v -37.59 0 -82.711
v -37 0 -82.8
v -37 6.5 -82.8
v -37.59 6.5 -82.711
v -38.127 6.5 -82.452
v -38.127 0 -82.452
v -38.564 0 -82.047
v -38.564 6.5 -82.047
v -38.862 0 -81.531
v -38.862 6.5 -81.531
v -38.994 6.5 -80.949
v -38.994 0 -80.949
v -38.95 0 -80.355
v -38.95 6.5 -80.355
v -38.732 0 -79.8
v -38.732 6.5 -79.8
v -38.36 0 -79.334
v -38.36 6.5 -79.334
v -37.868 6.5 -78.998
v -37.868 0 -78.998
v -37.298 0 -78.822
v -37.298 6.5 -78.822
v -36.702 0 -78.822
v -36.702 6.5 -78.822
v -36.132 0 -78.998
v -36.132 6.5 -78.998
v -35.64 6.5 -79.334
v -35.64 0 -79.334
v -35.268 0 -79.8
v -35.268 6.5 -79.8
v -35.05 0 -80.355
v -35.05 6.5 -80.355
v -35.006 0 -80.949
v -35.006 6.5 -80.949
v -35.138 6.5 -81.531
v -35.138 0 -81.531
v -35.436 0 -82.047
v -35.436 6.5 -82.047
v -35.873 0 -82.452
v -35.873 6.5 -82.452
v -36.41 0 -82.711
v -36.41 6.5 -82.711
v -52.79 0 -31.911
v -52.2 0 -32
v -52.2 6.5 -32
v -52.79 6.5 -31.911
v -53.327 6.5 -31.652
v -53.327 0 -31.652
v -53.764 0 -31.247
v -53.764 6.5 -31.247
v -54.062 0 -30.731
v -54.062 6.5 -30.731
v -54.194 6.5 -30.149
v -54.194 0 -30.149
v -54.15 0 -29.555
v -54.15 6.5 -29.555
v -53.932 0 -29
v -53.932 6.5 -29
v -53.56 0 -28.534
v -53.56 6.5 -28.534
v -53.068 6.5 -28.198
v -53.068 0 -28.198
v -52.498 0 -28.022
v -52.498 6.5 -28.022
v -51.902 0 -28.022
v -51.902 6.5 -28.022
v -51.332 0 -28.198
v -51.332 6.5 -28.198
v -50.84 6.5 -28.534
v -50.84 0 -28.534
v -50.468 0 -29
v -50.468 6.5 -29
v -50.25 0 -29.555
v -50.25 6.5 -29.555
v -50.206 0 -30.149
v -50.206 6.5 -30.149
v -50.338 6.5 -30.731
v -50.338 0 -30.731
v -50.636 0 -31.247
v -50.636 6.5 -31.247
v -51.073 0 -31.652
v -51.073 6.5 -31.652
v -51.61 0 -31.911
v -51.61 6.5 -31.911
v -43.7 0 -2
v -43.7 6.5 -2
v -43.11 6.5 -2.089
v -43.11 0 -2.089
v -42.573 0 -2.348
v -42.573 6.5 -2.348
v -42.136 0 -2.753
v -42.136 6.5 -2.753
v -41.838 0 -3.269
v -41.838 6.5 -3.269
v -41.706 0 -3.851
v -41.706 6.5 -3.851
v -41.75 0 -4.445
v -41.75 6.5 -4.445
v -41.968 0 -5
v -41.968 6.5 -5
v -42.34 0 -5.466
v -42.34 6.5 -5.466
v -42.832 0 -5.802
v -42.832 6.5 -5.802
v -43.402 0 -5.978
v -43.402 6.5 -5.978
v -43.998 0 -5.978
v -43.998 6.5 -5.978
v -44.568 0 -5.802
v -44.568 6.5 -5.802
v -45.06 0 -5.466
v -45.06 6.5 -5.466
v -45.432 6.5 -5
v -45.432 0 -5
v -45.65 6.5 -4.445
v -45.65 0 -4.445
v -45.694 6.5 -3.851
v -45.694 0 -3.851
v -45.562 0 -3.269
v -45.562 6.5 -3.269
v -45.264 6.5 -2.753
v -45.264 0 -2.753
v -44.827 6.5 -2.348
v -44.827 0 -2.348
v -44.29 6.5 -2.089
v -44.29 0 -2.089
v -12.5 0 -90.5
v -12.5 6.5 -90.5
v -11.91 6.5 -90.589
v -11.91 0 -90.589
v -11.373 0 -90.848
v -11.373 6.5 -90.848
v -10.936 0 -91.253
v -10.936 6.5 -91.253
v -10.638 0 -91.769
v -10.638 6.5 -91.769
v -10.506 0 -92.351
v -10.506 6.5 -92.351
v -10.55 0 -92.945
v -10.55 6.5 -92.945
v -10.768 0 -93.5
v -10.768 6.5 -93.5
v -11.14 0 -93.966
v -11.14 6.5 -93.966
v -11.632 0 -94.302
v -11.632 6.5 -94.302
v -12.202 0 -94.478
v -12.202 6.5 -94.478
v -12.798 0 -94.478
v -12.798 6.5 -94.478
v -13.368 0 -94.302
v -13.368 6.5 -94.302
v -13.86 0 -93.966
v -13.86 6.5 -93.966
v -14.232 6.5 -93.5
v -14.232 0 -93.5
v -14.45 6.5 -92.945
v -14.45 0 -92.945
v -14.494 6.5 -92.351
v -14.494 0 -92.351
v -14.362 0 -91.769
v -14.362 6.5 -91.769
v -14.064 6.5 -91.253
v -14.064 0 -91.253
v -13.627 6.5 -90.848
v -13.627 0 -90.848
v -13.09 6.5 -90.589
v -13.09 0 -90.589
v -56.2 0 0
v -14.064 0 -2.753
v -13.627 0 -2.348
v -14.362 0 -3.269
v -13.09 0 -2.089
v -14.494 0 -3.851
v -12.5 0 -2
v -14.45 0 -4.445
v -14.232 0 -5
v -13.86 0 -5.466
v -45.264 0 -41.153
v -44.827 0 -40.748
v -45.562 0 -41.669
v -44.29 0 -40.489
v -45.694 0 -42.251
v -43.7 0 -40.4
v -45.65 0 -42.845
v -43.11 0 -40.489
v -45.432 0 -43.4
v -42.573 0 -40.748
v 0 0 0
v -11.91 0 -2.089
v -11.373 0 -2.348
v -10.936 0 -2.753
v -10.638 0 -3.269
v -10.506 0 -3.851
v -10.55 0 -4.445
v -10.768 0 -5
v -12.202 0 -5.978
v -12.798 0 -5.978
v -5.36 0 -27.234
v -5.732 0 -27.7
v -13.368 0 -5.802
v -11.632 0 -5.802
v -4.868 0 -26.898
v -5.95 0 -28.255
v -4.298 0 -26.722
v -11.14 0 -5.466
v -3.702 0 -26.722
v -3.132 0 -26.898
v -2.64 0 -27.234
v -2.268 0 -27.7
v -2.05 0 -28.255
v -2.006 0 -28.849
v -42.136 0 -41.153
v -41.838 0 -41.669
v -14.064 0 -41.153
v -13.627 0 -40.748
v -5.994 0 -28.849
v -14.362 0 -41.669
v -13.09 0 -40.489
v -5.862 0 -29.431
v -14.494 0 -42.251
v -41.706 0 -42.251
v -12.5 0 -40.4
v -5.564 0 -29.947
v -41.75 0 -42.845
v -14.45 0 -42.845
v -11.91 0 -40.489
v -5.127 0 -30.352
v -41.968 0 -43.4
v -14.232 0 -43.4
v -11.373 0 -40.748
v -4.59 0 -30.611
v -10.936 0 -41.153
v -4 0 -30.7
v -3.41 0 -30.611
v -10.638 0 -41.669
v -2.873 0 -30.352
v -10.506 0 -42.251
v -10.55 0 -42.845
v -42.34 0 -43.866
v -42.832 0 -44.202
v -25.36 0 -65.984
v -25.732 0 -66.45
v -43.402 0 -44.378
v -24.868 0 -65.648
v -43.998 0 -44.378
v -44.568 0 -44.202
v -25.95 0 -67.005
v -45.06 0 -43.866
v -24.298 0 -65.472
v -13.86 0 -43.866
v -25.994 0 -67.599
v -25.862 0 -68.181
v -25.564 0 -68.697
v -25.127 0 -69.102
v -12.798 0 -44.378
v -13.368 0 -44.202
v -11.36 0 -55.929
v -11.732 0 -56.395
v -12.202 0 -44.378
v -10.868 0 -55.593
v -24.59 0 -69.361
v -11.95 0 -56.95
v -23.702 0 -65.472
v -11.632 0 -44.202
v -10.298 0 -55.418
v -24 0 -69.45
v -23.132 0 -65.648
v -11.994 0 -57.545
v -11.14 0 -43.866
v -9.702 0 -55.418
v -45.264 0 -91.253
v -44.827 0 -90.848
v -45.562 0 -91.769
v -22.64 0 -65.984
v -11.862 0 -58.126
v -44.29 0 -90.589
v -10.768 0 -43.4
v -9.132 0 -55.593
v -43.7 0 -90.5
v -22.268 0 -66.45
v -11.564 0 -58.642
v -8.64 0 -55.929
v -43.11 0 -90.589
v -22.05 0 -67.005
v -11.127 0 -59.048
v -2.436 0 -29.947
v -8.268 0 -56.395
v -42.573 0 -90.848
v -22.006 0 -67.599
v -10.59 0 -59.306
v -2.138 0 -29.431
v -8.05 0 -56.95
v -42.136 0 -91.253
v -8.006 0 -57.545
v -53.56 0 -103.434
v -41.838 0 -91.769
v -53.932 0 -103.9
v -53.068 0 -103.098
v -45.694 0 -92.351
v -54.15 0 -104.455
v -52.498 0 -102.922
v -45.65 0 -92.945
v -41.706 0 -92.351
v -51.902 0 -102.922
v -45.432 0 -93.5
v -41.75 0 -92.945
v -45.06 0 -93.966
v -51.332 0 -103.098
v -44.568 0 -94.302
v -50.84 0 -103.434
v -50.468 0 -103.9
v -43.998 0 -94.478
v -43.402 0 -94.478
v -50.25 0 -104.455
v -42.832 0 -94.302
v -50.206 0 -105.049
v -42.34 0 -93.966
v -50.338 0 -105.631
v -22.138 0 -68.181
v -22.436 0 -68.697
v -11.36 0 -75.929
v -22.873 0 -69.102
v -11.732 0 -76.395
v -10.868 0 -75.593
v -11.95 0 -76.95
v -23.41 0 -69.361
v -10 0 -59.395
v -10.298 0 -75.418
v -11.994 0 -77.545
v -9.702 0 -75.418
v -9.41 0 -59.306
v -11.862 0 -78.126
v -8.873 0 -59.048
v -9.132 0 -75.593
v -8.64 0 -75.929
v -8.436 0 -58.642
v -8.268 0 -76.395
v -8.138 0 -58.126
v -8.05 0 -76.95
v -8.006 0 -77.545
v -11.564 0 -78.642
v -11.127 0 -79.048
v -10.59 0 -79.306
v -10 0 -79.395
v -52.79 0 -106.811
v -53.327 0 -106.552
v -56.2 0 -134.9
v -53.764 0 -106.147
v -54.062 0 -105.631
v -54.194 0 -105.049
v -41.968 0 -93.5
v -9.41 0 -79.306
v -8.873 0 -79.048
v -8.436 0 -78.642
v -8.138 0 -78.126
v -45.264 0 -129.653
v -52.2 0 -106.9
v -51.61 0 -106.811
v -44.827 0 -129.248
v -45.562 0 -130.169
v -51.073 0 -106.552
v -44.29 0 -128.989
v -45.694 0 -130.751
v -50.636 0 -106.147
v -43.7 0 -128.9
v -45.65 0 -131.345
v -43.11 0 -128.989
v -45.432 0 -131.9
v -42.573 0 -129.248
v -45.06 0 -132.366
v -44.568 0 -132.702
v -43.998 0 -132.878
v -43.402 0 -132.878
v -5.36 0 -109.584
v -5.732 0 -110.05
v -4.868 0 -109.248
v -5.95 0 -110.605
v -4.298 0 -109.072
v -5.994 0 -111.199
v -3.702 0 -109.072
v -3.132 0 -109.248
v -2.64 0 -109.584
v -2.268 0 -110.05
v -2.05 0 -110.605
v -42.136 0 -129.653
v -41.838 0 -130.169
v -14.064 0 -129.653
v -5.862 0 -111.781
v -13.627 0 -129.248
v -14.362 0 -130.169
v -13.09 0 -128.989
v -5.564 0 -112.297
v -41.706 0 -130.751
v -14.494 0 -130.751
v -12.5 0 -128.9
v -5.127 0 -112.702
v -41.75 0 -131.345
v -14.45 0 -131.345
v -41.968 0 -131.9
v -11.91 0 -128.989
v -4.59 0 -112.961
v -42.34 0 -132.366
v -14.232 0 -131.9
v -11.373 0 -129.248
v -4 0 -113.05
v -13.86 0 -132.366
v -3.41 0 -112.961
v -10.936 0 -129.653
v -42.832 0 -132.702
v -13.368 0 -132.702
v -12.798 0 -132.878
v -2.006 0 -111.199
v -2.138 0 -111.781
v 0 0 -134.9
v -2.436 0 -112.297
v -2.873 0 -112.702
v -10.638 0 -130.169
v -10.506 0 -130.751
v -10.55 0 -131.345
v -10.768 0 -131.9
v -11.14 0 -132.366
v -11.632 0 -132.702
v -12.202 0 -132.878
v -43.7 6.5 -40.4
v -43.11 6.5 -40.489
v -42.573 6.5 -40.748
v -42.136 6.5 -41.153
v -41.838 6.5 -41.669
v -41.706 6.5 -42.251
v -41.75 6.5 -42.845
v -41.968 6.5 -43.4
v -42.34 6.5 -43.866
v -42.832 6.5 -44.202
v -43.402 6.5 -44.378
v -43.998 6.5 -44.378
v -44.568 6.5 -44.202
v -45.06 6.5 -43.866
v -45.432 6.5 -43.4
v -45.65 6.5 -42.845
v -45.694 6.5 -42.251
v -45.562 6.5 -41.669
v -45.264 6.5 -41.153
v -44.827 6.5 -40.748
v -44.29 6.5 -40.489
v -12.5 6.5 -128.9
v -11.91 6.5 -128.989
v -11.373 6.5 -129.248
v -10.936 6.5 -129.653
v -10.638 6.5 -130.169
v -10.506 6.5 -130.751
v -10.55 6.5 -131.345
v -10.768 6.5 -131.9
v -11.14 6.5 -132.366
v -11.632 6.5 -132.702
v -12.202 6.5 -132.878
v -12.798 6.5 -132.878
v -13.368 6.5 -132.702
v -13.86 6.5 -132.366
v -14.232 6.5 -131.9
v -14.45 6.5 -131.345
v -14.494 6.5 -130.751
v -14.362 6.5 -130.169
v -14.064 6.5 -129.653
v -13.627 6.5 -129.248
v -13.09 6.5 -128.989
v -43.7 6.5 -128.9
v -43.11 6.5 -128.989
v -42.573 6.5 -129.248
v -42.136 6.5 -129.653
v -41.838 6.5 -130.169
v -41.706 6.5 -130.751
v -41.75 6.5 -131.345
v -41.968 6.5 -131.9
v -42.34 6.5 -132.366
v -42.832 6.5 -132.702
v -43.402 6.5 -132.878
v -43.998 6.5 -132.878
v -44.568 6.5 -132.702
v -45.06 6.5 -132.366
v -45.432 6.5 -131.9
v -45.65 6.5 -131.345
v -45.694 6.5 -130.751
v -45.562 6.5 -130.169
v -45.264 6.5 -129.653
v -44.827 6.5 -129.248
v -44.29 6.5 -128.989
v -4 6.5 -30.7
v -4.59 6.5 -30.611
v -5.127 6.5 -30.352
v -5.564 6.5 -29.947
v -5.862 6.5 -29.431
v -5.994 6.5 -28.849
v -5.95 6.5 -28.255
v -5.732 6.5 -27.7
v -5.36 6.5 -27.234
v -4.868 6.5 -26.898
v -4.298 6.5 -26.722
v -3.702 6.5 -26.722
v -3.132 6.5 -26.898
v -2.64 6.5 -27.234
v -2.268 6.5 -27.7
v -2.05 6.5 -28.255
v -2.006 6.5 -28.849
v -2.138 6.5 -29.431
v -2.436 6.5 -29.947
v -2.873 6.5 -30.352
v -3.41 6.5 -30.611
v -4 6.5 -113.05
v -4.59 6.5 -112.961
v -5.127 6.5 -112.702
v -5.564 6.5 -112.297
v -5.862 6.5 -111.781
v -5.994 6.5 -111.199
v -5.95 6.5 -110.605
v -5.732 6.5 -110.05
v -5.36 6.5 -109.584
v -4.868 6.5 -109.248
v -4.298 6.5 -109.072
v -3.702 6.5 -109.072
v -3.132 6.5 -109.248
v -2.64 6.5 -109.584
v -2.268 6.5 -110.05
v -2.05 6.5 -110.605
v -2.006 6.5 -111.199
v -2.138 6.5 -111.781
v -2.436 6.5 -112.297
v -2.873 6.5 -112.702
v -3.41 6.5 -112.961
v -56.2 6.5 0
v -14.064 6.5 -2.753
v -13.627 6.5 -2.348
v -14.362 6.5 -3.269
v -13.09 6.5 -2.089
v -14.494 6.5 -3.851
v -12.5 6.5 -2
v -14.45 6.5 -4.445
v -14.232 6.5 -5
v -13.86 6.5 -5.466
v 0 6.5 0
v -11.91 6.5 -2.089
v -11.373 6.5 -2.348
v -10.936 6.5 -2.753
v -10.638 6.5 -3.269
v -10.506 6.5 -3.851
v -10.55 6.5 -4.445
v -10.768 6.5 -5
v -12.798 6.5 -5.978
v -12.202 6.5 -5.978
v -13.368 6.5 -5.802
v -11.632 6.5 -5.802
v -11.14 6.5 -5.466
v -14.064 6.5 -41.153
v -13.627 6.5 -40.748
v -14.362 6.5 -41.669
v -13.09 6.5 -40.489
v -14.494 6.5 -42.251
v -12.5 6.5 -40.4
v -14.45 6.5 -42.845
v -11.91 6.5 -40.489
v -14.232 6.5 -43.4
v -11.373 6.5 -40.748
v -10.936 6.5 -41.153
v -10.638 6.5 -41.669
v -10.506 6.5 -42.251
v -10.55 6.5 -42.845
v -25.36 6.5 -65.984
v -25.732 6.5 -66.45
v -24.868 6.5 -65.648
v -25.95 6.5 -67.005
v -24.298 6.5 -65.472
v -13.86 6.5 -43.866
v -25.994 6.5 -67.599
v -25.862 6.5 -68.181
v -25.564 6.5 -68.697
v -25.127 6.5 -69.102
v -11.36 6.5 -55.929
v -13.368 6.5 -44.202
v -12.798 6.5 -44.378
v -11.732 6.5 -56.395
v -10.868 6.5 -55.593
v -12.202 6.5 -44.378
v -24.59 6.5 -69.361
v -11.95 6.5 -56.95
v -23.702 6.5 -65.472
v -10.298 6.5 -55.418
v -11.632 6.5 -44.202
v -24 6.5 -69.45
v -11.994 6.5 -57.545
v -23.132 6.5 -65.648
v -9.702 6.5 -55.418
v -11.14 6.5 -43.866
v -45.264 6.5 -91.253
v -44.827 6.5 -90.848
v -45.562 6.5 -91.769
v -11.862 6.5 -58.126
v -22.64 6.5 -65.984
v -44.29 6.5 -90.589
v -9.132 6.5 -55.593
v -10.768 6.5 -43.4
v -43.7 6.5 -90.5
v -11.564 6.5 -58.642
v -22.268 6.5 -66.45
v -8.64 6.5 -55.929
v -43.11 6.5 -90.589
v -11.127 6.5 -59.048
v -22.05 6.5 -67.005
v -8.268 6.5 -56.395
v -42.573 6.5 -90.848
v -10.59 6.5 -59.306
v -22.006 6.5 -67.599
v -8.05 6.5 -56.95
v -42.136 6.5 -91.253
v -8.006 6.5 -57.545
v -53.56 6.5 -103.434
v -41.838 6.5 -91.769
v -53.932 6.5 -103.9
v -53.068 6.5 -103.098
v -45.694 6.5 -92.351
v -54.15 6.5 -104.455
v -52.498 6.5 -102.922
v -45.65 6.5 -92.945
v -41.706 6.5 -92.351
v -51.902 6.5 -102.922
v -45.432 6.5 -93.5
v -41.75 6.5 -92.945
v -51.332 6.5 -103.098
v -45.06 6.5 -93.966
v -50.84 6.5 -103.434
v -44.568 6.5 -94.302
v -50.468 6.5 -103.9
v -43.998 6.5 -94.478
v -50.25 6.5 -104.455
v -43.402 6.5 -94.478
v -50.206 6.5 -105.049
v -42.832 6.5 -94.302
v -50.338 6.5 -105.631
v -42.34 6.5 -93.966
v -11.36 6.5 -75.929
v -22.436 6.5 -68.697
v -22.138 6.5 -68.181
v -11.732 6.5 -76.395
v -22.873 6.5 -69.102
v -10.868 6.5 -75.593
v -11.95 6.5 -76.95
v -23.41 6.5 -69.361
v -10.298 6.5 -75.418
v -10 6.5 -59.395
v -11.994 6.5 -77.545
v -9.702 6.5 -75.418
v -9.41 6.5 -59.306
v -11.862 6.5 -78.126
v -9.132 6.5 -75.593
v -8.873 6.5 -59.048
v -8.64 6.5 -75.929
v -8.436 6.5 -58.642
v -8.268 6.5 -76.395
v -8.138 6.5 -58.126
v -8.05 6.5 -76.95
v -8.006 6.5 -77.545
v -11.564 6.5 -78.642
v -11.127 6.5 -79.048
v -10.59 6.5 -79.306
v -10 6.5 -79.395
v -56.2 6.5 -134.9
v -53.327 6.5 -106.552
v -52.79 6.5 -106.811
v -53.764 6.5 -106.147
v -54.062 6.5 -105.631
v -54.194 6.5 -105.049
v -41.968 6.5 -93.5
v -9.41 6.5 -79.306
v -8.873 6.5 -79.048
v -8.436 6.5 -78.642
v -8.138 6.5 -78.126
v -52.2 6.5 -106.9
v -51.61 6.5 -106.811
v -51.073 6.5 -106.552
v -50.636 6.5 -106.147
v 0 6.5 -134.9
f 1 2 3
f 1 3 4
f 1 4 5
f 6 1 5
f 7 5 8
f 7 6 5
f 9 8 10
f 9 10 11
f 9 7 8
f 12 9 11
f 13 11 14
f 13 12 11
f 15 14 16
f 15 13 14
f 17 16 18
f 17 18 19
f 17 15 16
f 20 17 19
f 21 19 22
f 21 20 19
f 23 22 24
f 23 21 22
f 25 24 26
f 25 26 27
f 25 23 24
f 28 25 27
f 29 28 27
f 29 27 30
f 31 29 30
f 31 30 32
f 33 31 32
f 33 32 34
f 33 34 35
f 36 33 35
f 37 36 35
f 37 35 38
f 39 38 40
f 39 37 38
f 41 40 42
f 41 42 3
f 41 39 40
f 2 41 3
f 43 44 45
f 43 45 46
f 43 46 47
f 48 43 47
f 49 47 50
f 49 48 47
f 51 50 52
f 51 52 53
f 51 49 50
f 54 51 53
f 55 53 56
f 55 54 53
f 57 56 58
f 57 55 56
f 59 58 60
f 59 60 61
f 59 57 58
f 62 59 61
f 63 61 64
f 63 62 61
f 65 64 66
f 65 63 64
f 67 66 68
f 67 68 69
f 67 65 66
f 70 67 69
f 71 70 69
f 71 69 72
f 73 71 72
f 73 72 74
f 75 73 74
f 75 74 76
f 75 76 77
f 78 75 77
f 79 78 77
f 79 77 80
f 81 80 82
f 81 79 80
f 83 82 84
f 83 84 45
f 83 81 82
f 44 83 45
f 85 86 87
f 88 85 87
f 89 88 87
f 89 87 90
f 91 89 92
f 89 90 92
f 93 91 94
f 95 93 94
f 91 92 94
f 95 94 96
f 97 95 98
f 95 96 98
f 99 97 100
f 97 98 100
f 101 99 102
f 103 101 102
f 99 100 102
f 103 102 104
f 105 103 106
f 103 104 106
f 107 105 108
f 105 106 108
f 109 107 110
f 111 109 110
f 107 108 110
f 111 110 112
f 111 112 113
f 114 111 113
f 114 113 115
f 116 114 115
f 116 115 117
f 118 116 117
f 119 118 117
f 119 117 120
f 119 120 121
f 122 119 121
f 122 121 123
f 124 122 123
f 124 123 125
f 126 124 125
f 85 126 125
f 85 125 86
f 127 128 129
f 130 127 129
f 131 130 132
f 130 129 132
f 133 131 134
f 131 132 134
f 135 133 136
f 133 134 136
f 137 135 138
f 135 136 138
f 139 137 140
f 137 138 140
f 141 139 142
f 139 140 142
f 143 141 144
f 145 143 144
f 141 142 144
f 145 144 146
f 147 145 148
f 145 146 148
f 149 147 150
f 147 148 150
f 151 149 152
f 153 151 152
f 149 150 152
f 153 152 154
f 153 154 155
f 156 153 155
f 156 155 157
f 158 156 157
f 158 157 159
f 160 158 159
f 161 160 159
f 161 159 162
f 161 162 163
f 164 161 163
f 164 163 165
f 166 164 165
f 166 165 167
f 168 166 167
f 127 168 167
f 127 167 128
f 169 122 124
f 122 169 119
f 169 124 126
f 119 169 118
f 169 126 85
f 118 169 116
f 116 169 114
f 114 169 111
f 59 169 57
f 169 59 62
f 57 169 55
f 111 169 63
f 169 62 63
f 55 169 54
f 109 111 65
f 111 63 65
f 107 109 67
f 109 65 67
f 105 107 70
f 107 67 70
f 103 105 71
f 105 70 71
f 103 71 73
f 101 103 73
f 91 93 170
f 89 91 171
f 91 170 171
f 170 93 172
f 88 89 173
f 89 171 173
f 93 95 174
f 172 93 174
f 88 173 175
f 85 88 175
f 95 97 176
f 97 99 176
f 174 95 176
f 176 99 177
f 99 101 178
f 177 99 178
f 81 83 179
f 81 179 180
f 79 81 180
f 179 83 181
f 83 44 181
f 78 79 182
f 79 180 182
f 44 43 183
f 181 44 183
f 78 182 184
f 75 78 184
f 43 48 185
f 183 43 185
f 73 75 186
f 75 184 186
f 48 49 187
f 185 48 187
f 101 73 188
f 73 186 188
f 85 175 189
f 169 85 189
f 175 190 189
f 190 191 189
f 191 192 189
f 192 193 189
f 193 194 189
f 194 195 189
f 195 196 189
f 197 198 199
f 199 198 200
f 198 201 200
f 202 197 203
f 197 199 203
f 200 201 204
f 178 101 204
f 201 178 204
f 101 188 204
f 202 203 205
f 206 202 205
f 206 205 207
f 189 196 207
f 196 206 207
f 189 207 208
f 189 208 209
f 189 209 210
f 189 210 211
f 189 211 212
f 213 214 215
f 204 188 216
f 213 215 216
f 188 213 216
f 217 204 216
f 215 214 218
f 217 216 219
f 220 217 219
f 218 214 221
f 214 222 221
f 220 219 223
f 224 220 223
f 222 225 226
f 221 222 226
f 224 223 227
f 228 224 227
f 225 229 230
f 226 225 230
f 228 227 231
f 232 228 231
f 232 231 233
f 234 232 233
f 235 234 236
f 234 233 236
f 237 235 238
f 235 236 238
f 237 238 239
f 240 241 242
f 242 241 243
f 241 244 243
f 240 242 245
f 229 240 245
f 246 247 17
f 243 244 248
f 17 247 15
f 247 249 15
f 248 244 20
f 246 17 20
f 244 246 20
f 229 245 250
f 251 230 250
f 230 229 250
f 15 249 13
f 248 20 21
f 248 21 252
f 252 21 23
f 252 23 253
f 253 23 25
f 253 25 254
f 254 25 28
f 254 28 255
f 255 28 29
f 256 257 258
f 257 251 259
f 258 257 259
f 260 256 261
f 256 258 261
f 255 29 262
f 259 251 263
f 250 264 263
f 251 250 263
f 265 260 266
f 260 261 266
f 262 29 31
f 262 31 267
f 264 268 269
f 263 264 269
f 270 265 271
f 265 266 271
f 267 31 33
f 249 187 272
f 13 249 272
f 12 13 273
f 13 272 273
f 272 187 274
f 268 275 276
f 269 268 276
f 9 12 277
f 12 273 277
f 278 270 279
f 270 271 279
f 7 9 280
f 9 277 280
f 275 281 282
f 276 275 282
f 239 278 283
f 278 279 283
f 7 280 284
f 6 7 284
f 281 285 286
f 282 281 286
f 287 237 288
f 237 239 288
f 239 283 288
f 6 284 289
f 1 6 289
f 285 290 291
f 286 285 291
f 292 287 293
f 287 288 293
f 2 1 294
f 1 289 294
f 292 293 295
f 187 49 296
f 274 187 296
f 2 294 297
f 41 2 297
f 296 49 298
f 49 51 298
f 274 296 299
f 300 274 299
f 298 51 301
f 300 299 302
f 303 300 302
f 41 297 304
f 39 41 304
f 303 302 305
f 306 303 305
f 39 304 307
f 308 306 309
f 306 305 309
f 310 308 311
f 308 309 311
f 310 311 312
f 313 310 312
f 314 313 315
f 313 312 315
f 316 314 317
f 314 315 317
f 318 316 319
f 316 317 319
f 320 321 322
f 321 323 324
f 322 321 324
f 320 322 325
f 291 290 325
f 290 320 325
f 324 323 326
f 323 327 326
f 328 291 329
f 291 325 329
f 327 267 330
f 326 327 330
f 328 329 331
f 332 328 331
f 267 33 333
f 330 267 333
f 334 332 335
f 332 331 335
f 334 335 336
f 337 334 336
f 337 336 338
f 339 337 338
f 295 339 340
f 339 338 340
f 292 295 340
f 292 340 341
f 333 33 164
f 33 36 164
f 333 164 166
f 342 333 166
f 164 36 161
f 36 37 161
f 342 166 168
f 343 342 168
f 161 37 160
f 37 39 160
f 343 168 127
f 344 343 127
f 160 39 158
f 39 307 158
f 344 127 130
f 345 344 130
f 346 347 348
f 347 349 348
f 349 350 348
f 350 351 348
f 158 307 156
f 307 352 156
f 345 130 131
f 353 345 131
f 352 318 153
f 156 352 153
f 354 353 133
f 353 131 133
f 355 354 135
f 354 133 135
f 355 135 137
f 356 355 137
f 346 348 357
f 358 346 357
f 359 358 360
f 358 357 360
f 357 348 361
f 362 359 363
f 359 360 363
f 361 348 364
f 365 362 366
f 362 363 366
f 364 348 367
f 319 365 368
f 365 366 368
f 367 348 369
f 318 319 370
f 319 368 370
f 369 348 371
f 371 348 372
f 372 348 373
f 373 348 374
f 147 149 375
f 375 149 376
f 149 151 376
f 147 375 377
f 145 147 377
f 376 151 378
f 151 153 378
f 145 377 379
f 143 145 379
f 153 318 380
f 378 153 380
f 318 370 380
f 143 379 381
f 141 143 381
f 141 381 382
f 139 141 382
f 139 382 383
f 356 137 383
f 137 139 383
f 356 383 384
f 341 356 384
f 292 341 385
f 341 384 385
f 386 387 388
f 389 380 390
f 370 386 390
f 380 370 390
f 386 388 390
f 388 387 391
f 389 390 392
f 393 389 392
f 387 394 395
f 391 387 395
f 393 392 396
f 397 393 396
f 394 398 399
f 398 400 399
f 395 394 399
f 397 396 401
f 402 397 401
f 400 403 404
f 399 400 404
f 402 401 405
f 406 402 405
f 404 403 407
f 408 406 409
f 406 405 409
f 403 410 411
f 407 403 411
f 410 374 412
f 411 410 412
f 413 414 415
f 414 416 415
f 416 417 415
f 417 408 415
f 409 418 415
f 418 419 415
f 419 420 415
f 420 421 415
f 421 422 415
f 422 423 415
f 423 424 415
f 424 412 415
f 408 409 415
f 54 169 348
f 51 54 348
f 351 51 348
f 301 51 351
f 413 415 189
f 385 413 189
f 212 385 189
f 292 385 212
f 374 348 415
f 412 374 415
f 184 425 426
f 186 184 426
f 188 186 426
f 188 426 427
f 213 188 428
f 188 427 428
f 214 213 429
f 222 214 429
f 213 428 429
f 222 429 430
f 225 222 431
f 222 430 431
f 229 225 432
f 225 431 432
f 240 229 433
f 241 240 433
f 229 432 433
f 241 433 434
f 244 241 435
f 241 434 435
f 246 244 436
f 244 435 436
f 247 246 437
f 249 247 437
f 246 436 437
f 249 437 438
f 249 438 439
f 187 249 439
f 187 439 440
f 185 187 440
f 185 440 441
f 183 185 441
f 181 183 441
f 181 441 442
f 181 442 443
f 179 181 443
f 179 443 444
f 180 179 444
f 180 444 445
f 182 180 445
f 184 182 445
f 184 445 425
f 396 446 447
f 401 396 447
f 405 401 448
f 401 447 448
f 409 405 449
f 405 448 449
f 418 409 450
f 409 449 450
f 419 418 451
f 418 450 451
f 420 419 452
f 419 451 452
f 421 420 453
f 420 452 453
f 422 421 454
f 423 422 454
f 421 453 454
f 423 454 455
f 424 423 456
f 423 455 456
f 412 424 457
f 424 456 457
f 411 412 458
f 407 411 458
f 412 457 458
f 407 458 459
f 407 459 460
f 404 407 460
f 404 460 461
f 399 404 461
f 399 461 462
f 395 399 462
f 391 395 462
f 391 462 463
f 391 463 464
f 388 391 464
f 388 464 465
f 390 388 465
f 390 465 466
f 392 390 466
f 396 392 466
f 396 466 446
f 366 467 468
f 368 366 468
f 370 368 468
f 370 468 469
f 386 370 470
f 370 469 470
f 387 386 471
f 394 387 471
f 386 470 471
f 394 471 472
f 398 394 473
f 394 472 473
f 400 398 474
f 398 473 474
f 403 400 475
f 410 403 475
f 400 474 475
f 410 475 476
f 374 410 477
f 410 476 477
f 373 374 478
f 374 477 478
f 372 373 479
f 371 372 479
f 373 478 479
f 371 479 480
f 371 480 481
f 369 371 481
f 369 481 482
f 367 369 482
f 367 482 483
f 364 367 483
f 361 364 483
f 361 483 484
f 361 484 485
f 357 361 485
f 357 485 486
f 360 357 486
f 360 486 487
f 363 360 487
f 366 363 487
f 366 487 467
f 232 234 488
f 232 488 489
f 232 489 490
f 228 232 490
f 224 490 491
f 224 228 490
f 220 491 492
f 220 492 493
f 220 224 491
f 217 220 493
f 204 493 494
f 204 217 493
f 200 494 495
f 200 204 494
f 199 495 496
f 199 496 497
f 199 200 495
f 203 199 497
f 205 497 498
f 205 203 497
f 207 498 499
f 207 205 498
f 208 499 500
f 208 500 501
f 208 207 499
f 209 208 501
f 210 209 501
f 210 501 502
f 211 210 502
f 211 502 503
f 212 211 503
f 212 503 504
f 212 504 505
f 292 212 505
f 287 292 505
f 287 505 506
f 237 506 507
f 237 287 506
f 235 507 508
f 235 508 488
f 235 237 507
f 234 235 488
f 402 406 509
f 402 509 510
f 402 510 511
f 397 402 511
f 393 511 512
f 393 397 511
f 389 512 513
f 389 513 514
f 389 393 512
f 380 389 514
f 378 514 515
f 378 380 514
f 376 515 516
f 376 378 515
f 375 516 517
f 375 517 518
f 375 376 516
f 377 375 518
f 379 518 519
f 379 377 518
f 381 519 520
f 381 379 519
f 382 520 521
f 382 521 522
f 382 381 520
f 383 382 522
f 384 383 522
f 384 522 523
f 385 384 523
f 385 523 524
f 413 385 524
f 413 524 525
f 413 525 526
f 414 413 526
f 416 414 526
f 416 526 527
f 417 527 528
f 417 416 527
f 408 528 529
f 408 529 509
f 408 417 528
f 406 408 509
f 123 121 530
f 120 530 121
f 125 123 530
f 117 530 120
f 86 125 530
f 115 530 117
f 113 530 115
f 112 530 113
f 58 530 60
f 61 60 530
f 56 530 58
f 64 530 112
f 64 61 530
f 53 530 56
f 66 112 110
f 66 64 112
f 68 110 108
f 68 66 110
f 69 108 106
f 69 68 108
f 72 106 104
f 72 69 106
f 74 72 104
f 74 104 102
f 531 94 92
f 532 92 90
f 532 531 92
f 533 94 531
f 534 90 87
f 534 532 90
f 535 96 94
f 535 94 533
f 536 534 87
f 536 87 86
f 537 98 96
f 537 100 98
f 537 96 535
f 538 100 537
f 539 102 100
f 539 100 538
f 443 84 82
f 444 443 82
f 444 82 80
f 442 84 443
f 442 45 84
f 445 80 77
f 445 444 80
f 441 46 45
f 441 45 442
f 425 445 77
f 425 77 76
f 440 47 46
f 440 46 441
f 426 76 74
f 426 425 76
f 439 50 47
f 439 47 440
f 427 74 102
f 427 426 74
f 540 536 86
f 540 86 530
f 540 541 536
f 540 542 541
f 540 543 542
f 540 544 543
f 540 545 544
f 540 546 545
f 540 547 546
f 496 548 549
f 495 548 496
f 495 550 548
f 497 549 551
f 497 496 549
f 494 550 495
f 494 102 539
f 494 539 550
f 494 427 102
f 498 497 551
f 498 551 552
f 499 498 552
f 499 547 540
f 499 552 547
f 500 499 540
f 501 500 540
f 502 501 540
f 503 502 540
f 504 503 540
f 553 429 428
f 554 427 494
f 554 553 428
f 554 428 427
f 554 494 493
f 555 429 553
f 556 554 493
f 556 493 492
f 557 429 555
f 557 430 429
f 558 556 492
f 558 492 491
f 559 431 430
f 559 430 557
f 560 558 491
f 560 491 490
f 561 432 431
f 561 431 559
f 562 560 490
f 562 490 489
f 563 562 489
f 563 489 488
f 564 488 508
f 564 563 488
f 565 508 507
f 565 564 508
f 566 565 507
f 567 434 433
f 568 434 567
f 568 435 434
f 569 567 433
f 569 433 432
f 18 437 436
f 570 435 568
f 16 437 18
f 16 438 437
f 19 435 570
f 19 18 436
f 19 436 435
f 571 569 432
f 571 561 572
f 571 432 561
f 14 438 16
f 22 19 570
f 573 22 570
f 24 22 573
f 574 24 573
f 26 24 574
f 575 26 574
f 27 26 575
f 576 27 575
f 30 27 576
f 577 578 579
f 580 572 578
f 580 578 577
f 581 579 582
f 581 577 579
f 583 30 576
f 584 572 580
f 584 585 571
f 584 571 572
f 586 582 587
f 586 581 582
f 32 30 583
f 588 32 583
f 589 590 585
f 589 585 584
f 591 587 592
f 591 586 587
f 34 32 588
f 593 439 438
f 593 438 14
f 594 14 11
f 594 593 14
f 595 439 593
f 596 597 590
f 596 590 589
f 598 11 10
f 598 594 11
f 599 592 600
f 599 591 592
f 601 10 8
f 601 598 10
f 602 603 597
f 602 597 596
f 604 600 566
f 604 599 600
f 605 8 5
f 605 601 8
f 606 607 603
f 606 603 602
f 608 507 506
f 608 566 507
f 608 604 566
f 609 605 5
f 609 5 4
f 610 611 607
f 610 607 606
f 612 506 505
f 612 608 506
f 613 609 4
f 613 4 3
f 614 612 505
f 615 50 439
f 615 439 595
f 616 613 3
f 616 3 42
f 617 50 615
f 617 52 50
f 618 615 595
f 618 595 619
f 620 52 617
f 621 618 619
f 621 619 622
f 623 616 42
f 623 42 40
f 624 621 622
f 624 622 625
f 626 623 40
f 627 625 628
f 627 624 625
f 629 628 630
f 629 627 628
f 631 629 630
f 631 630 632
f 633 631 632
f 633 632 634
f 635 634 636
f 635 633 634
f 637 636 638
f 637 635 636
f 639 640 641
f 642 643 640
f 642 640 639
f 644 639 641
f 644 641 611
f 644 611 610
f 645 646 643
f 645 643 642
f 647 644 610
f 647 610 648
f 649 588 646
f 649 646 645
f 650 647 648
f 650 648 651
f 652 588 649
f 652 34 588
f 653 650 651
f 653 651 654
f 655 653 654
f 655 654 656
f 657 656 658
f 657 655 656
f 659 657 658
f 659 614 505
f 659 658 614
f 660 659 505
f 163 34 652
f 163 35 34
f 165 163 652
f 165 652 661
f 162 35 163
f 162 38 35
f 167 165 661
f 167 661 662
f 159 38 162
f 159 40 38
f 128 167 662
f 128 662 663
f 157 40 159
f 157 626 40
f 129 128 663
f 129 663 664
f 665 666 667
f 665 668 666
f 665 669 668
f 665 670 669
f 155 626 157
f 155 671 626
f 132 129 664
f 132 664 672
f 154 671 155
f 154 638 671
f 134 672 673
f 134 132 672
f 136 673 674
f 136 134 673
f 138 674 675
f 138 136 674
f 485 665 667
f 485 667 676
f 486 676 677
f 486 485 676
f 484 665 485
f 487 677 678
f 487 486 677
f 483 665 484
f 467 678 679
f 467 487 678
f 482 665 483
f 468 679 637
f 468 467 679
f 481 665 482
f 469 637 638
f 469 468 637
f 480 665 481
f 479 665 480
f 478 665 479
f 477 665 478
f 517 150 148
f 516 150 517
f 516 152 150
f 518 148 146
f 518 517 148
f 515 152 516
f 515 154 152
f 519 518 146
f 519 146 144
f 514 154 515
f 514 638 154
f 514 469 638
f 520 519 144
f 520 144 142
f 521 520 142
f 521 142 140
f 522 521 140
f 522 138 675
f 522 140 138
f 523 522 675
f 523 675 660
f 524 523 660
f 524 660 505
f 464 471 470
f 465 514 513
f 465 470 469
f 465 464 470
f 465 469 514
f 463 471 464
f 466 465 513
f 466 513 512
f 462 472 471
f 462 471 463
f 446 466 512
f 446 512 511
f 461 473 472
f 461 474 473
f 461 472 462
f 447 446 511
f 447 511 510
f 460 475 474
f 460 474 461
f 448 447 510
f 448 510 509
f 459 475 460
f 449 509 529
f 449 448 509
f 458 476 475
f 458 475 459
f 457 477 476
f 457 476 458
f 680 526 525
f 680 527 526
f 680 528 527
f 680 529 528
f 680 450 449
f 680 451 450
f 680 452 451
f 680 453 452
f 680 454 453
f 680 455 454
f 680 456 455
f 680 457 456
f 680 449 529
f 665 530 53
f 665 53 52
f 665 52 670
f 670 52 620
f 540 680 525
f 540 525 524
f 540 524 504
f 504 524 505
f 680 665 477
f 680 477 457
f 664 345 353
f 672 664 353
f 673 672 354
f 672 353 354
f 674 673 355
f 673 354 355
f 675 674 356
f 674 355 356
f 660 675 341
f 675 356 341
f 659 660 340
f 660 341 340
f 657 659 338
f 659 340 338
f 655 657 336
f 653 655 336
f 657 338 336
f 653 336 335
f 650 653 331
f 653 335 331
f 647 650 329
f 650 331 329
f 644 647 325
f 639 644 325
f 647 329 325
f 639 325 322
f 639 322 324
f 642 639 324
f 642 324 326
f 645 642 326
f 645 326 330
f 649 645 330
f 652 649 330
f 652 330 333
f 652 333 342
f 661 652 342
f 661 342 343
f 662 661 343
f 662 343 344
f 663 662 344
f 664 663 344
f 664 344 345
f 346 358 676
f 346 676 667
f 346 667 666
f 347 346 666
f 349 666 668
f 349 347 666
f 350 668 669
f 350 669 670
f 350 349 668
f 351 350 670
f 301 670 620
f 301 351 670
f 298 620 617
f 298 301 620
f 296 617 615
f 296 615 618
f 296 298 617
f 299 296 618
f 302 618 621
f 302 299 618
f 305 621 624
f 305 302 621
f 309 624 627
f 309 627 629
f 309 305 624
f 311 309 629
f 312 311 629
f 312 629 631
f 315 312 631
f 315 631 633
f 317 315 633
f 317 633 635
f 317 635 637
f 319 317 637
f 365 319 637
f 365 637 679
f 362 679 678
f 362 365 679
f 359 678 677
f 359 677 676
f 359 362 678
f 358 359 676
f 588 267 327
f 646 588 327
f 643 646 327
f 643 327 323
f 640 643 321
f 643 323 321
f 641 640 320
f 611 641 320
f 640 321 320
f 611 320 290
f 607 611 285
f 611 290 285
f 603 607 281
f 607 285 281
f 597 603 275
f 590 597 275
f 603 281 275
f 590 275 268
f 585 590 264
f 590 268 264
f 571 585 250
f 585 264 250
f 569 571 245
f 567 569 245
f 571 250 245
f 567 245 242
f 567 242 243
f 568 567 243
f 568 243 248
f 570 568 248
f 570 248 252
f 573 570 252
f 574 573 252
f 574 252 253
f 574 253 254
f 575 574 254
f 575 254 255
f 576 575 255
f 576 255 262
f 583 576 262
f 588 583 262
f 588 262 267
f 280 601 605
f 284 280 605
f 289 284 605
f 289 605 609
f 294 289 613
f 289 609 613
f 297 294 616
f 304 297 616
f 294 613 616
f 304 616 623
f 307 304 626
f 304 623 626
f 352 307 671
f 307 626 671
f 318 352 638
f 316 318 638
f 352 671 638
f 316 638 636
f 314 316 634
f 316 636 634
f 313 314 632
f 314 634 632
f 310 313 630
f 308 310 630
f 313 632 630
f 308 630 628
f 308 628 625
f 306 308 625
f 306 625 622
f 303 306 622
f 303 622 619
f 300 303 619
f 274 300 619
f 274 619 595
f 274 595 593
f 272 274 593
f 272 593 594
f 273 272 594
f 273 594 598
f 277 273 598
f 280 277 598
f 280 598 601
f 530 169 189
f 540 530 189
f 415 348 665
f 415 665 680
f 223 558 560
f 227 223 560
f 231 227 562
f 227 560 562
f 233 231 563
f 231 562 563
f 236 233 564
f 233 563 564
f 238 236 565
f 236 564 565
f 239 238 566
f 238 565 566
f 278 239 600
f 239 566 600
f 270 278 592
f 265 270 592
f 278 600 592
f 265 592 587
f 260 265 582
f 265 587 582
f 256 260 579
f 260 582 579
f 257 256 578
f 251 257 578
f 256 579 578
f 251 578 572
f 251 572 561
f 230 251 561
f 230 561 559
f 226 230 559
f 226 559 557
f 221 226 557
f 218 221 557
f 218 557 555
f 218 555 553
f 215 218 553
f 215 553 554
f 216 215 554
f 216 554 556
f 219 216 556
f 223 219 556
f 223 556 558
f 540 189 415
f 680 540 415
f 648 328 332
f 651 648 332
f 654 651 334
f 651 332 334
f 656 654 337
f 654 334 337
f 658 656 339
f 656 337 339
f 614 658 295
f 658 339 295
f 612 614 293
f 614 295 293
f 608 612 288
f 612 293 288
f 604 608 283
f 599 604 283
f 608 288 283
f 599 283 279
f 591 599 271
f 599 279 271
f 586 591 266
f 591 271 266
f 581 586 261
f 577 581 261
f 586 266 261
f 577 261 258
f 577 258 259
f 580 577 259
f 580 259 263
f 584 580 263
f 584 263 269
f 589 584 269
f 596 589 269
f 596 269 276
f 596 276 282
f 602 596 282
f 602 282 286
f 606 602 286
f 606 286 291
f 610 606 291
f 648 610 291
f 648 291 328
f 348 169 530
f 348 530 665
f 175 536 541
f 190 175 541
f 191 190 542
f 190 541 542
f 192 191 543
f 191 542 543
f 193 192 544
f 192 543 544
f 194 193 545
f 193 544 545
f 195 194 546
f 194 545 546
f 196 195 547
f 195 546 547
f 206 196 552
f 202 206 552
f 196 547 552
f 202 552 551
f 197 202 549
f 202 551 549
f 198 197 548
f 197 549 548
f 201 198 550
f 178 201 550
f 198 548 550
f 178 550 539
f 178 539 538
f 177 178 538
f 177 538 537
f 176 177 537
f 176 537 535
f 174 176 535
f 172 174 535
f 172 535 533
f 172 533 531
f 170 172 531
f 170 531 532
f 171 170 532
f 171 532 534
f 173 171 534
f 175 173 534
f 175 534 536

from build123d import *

# Parameters (mm, degrees)
SKETCH1_W                                = 56.2
SKETCH1_H                                = 134.9
SKETCH1_R                                = 2
BOSS_EXTRUDE1_DEPTH                      = 6.5
POLOLU_MOUNTING_BRACKET_R                = 2
POLOLU_37MM_MOUNTING_BRACKET_HOLES_DEPTH = 147.282945007
SKETCH2_R                                = 2
SPINDLE_MOUNT_DEPTH                      = 147.282945007


with BuildPart() as part:
    # Sketch1 → Boss-Extrude1 (new body)
    with BuildSketch(Plane(origin=(0, 0, 0), x_dir=(1, 0, 0), z_dir=(0, 1, 0))):
        with Locations((-28.1, 67.45)):
            Rectangle(SKETCH1_W, SKETCH1_H)
        with Locations(Location((-52.2, 104.9, 0), (0, 0, 90))):
            Circle(SKETCH1_R, mode=Mode.SUBTRACT)
        with Locations(Location((-4, 111.05, 0), (0, 0, 90))):
            Circle(SKETCH1_R, mode=Mode.SUBTRACT)
        with Locations(Location((-37, 80.8, 0), (0, 0, 90))):
            Circle(SKETCH1_R, mode=Mode.SUBTRACT)
        with Locations(Location((-52.2, 30, 0), (0, 0, 90))):
            Circle(SKETCH1_R, mode=Mode.SUBTRACT)
        with Locations(Location((-4, 28.7, 0), (0, 0, 90))):
            Circle(SKETCH1_R, mode=Mode.SUBTRACT)
    extrude(amount=BOSS_EXTRUDE1_DEPTH)

    # Pololu Mounting Bracket → Pololu 37mm mounting bracket holes (cut, through all)
    with BuildSketch(Plane(origin=(0, 6.5, 0), x_dir=(1, 0, 0), z_dir=(0, 1, 0))):
        with Locations(Location((-43.7, 4, 0), (0, 0, 270))):
            Circle(POLOLU_MOUNTING_BRACKET_R)
        with Locations(Location((-12.5, 4, 0), (0, 0, 270))):
            Circle(POLOLU_MOUNTING_BRACKET_R)
        with Locations(Location((-43.7, 42.4, 0), (0, 0, 270))):
            Circle(POLOLU_MOUNTING_BRACKET_R)
        with Locations(Location((-12.5, 42.4, 0), (0, 0, 270))):
            Circle(POLOLU_MOUNTING_BRACKET_R)
        with Locations(Location((-43.7, 130.9, 0), (0, 0, 270))):
            Circle(POLOLU_MOUNTING_BRACKET_R)
        with Locations(Location((-12.5, 130.9, 0), (0, 0, 270))):
            Circle(POLOLU_MOUNTING_BRACKET_R)
        with Locations(Location((-12.5, 92.5, 0), (0, 0, 270))):
            Circle(POLOLU_MOUNTING_BRACKET_R)
        with Locations(Location((-43.7, 92.5, 0), (0, 0, 270))):
            Circle(POLOLU_MOUNTING_BRACKET_R)
    extrude(amount=-POLOLU_37MM_MOUNTING_BRACKET_HOLES_DEPTH, mode=Mode.SUBTRACT)

    # Sketch2 → Spindle Mount (cut, through all)
    with BuildSketch(Plane.XZ):
        with Locations(Location((-24, -67.45, 0), (0, 0, 270))):
            Circle(SKETCH2_R)
        with Locations(Location((-10, -77.39530997, 0), (0, 0, 270))):
            Circle(SKETCH2_R)
        with Locations(Location((-10, -57.39530997, 0), (0, 0, 270))):
            Circle(SKETCH2_R)
    extrude(amount=-SPINDLE_MOUNT_DEPTH, mode=Mode.SUBTRACT)


solid = part.part
